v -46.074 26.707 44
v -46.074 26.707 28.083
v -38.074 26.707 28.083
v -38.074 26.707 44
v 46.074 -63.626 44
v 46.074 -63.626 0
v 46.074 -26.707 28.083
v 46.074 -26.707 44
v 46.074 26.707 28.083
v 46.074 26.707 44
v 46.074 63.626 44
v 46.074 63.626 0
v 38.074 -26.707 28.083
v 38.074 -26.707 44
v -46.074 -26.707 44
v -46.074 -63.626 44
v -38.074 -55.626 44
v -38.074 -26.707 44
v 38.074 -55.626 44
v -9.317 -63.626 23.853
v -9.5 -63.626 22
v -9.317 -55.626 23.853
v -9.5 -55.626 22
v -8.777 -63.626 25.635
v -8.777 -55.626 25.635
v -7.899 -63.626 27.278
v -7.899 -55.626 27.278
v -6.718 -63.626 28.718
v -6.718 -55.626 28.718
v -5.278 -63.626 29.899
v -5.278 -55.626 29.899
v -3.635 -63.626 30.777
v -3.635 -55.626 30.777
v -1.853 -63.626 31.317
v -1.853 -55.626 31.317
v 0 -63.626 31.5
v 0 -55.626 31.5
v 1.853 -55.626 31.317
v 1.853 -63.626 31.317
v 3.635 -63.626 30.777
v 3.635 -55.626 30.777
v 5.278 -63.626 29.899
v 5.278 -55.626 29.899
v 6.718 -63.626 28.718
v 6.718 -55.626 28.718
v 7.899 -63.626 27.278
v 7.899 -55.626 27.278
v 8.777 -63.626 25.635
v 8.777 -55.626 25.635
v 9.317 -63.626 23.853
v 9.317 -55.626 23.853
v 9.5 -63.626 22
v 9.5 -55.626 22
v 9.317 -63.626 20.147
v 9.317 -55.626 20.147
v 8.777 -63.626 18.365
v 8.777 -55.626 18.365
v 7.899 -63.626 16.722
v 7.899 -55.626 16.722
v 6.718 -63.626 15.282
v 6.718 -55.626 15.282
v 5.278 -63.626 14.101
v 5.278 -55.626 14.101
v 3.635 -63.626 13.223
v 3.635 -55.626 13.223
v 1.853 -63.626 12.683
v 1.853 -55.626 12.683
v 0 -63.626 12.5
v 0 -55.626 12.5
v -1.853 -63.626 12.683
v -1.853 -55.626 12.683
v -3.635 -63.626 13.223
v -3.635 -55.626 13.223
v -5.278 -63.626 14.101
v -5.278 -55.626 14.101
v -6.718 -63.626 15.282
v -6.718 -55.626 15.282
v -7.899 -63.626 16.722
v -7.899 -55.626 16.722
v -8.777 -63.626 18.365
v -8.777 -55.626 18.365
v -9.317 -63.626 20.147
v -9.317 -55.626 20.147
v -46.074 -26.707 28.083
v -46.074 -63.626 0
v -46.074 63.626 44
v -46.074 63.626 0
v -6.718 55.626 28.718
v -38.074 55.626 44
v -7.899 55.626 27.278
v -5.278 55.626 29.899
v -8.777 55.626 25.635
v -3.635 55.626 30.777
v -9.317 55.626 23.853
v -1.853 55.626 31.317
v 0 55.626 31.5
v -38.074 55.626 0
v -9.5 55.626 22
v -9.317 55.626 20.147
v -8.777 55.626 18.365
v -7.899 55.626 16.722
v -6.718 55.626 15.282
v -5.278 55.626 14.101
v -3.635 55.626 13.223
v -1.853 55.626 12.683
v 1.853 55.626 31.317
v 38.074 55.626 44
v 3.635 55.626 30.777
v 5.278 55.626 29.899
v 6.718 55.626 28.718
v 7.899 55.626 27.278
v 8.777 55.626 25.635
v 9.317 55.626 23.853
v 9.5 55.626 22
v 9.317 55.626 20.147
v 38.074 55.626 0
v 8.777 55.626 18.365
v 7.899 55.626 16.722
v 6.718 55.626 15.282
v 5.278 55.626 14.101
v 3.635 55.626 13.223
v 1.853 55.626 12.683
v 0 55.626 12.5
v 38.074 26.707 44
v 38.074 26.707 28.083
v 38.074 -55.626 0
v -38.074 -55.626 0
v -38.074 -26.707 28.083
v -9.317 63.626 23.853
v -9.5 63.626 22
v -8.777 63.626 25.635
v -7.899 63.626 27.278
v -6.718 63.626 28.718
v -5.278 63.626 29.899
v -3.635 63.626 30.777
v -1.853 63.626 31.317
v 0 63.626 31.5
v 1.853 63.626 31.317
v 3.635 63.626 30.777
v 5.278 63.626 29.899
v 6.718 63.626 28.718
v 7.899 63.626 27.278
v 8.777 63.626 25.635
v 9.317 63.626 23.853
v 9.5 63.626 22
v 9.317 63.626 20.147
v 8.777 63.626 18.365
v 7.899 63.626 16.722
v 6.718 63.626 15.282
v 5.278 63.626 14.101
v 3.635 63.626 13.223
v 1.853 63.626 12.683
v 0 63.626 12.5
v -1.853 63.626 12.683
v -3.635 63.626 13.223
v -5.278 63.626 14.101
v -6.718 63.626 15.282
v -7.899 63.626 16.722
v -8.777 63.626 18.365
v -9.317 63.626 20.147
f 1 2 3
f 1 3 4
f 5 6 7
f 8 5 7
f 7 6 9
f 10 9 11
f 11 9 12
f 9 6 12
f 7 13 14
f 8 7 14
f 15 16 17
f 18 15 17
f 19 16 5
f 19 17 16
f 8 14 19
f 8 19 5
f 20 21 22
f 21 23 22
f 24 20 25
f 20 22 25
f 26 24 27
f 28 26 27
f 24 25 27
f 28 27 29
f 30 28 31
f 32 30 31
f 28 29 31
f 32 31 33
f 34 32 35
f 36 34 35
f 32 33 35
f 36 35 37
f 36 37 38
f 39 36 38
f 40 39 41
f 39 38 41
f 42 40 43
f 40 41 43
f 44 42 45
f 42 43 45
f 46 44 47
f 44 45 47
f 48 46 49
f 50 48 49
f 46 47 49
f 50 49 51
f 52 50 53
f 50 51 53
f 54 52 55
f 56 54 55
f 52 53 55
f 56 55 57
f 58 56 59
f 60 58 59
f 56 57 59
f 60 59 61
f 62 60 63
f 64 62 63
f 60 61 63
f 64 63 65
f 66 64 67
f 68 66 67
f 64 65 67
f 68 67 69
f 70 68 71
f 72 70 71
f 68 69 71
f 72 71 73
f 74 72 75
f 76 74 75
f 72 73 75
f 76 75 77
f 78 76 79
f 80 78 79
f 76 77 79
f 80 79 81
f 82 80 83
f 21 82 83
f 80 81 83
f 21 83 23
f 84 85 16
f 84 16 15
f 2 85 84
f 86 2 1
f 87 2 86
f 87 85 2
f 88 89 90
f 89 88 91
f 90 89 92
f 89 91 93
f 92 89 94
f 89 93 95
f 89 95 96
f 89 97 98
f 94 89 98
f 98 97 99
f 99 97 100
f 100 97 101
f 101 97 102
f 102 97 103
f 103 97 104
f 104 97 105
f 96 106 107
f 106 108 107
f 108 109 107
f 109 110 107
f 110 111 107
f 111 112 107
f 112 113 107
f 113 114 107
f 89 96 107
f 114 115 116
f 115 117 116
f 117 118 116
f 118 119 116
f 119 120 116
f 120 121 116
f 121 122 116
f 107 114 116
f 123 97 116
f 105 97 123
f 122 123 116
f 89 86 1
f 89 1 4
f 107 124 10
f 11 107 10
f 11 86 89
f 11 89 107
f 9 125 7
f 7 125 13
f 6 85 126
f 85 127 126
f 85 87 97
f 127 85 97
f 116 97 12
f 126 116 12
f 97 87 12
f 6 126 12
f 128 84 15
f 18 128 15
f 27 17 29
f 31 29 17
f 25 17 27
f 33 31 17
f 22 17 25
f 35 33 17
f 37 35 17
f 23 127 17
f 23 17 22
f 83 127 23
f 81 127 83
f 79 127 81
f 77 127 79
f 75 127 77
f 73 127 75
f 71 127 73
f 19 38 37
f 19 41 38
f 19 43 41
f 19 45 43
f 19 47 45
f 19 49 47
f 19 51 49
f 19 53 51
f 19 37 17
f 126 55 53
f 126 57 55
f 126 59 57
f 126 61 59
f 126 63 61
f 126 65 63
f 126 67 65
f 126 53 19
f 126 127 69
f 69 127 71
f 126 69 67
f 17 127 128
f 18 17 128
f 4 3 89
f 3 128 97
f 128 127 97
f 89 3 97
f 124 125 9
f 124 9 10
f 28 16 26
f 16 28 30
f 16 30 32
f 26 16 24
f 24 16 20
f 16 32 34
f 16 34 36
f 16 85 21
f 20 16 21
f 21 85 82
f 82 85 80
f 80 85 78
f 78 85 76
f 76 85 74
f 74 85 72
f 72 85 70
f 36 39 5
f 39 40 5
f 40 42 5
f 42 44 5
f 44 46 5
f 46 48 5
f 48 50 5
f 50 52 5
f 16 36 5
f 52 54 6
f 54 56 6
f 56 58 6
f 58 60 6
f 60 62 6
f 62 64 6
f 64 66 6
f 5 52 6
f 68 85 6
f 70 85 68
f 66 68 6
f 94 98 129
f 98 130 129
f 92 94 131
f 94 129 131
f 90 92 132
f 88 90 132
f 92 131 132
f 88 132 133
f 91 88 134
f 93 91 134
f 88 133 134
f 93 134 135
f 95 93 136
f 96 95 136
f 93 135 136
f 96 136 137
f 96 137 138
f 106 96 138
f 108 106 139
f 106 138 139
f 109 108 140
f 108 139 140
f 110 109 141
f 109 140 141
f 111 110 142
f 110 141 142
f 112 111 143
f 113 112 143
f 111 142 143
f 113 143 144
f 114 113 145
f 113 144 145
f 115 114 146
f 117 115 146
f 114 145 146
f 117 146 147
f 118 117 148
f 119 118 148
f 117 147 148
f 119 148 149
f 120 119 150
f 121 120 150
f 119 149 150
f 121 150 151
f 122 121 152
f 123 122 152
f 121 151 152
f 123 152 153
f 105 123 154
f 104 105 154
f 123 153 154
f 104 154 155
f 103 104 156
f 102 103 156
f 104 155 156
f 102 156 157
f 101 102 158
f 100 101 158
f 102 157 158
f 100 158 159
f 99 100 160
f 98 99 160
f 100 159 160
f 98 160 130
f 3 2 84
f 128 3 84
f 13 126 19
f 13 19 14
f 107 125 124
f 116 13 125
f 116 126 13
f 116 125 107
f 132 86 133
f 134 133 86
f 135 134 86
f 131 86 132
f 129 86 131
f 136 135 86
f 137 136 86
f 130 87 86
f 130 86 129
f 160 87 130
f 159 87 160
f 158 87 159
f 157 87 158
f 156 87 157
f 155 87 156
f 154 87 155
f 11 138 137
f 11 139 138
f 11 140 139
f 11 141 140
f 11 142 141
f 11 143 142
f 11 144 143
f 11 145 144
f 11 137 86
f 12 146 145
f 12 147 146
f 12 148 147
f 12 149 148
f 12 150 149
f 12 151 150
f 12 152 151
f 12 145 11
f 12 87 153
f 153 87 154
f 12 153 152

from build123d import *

# Parameters (mm, degrees)
F0_W     = 92.1482667327
F0_H     = 127.2523701191
F0_W_2   = 76.1482641101
F0_H_2   = 111.2523674965
F1_DEPTH = 44
F3_W     = 53.4138903022
F3_H     = 15.9167165458
F2_W     = 53.4138903022
F2_H     = 15.9167165458
F4_DEPTH = 146.8
F6_R     = 9.5
F5_R     = 9.5
F7_DEPTH = 171.1


with BuildPart() as f1:
    # F0 (on Top) → F1 (new body)
    with BuildSketch(Plane.XY):
        Rectangle(F0_W, F0_H)
        Rectangle(F0_W_2, F0_H_2, mode=Mode.SUBTRACT)
    extrude(amount=F1_DEPTH)

    # F3 (on face) + F2 (on face) → F4 (cut)
    with BuildSketch(Plane(origin=(-46.0741333663, 0, 0), x_dir=(0, -1, 0), z_dir=(-1, 0, 0))):
        with Locations((0, 36.0416417271)):
            Rectangle(F3_W, F3_H)
    with BuildSketch(Plane.YZ.offset(46.0741333663)):
        with Locations((0, 36.0416417271)):
            Rectangle(F2_W, F2_H)
    extrude(amount=-F4_DEPTH, dir=(-1, 0, 0), mode=Mode.SUBTRACT)

    # F6 (on face) + F5 (on face) → F7 (cut)
    with BuildSketch(Plane(origin=(0, 63.6261850595, 0), x_dir=(-1, 0, 0), z_dir=(0, 1, 0))):
        with Locations((0, 22)):
            Circle(F6_R)
    with BuildSketch(Plane.XZ.offset(63.6261850595)):
        with Locations((0, 22)):
            Circle(F5_R)
    extrude(amount=-F7_DEPTH, dir=(0, 1, 0), mode=Mode.SUBTRACT)


solid = f1.part
